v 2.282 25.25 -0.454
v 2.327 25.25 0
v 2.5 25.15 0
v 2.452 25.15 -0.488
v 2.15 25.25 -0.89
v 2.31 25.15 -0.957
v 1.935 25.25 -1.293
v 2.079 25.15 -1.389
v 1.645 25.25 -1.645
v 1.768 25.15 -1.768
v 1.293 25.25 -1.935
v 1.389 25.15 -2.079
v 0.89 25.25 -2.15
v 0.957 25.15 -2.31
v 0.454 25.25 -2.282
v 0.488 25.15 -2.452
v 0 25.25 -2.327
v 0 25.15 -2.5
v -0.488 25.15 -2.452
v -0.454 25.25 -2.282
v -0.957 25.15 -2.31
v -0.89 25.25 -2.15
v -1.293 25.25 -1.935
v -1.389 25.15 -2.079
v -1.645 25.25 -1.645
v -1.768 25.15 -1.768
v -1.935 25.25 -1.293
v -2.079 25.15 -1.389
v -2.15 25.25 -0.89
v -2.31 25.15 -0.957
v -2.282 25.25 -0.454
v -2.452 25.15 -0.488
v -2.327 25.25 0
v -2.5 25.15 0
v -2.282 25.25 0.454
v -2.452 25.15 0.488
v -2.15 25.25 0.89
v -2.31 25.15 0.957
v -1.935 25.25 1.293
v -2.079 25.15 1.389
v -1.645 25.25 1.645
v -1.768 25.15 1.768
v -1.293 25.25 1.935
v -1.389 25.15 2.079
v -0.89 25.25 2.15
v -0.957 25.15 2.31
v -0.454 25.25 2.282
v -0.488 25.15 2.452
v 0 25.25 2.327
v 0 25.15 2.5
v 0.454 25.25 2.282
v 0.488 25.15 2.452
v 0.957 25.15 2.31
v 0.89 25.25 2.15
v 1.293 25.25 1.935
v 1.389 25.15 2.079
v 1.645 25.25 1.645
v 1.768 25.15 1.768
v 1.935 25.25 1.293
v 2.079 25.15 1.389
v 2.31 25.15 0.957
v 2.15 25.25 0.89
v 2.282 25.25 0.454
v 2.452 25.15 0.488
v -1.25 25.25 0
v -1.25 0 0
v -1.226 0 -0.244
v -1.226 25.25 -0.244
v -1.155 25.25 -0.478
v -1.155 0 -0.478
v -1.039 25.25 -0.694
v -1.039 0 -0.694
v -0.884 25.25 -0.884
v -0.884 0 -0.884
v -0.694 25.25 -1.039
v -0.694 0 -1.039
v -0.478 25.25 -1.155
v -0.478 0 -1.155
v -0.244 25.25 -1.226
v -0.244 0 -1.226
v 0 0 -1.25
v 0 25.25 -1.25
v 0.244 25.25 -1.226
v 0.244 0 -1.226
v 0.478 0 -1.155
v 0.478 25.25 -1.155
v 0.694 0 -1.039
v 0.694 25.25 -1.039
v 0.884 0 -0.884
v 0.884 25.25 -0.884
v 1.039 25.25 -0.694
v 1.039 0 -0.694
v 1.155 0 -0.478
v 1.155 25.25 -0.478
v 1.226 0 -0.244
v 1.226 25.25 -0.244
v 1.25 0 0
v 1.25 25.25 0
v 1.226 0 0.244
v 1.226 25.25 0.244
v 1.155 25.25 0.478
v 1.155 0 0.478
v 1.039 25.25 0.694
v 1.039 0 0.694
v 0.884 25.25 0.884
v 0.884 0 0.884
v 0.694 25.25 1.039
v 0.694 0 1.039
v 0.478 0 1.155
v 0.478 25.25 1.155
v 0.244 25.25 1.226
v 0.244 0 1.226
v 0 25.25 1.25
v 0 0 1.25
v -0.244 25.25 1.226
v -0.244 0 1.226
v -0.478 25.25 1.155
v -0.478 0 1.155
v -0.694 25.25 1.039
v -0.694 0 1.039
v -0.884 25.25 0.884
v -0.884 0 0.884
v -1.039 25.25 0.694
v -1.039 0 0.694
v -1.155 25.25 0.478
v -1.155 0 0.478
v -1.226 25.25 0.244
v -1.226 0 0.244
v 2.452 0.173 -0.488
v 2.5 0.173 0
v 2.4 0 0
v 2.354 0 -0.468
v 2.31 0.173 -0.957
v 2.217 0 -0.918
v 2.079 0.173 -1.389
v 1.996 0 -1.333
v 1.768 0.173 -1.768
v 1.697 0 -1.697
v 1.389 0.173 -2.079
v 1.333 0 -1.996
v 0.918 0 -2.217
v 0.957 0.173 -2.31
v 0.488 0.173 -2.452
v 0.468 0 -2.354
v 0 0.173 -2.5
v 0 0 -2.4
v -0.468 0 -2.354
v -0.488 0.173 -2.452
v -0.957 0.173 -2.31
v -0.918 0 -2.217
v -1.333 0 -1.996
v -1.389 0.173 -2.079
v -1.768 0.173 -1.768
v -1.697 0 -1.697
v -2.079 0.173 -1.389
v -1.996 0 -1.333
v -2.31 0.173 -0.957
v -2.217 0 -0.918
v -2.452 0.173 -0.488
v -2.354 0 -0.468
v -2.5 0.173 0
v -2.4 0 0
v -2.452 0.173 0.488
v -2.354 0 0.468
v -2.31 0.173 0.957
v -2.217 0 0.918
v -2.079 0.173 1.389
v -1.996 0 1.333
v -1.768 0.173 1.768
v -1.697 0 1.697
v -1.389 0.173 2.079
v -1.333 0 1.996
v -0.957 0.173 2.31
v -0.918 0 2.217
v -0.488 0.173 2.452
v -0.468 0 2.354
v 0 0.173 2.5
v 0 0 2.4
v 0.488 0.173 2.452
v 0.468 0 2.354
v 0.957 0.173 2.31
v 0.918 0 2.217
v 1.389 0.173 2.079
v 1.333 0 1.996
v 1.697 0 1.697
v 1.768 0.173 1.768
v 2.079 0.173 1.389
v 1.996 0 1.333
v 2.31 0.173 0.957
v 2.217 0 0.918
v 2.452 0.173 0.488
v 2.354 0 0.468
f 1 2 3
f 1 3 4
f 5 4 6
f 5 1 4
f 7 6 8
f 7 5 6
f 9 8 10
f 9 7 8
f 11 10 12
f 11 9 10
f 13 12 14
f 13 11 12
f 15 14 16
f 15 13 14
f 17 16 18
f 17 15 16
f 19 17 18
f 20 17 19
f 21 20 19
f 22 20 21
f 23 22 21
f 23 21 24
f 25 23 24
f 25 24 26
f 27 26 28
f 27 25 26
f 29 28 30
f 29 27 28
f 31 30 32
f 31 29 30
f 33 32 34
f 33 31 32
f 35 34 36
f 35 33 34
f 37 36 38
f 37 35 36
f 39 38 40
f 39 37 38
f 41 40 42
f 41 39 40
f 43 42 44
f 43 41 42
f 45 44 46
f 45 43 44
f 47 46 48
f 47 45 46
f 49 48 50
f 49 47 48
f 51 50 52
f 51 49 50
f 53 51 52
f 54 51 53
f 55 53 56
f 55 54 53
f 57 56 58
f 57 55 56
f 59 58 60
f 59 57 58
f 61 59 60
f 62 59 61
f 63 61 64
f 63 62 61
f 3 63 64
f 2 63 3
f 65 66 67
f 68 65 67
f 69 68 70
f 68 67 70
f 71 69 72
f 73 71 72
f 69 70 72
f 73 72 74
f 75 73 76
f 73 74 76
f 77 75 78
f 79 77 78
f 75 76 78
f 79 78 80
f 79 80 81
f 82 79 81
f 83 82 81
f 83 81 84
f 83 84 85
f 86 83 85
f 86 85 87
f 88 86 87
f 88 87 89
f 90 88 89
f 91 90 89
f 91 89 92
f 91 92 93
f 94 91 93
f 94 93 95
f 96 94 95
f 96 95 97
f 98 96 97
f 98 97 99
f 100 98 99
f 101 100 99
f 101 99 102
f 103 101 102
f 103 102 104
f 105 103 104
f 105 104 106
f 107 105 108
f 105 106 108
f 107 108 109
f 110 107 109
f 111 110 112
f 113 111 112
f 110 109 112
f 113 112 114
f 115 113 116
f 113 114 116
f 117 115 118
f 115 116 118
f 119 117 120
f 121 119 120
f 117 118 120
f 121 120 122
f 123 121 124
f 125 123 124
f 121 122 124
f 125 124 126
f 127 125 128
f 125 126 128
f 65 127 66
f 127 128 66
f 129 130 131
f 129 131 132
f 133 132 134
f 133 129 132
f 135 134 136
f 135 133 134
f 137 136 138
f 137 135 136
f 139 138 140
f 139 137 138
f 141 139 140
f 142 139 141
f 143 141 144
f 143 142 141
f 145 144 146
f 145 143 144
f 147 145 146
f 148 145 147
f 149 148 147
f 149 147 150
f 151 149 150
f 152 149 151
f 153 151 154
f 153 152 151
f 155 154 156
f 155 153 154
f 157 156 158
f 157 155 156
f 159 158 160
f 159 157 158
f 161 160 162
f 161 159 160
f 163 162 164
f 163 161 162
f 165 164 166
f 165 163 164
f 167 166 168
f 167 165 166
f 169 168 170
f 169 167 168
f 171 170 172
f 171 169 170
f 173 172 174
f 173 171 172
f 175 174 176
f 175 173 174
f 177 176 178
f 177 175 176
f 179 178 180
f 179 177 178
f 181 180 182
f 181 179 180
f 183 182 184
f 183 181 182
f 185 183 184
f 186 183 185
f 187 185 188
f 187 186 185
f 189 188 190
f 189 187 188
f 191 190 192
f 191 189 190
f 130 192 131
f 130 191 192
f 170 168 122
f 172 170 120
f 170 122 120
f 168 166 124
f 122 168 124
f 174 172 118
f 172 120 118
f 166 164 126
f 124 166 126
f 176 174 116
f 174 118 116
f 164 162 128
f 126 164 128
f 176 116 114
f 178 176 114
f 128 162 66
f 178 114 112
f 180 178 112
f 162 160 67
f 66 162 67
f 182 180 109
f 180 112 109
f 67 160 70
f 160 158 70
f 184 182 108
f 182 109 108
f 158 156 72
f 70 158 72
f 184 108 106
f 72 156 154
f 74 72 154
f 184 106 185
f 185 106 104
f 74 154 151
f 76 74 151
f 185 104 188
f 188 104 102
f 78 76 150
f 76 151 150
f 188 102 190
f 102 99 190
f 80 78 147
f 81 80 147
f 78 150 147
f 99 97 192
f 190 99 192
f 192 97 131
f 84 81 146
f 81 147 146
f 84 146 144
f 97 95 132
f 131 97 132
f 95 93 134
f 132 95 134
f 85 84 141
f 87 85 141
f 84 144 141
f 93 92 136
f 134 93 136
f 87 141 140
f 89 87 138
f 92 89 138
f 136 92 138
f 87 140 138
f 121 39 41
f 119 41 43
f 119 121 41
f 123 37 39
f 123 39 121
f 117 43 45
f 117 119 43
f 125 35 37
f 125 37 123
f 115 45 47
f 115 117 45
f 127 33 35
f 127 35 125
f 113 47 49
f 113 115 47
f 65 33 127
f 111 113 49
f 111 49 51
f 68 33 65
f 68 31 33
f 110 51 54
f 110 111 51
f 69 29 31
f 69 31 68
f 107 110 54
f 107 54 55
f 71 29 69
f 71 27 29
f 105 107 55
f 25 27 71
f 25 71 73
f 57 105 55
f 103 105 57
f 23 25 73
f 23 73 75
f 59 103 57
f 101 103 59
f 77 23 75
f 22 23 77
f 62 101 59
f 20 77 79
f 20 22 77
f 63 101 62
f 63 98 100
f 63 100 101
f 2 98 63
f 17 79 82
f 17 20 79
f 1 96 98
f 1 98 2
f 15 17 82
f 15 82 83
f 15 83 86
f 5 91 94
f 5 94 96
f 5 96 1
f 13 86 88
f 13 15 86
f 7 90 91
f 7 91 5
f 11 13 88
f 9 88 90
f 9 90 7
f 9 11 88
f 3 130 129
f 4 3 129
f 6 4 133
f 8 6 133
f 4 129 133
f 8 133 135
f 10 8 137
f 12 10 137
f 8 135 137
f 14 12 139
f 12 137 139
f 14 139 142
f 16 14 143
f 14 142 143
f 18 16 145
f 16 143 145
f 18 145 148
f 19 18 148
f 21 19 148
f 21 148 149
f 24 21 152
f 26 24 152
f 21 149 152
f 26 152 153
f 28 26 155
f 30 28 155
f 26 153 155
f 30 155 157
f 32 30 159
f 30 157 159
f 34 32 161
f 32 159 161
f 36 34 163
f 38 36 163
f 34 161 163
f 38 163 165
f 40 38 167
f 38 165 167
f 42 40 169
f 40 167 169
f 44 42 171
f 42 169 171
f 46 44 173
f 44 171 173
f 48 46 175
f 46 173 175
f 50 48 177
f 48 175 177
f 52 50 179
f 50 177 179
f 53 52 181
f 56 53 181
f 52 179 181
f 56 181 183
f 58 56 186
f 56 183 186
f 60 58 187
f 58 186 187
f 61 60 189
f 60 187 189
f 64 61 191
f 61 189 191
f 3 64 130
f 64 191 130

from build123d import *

# Parameters (mm, degrees)
SKETCH2_R             = 2.5
BOSS_EXTRUDE1_DEPTH   = 25.25
CHAMFER1_SIZE         = 0.1
CHAMFER1_SIZE2        = 0.173205081
CHAMFER1_PART_2_SIZE  = 0.1
CHAMFER1_PART_2_SIZE2 = 0.173205081
M3X0_5_TAPPED_HOLE1_D = 2.5


with BuildPart() as part:
    # Sketch2 → Boss-Extrude1 (new body)
    with BuildSketch(Plane(origin=(0, 0, 0), x_dir=(1, 0, 0), z_dir=(0, 1, 0))):
        Circle(SKETCH2_R)
    extrude(amount=BOSS_EXTRUDE1_DEPTH)

    # Chamfer1
    chamfer1_edges = [part.edges().sort_by_distance(p)[0] for p in [
        (-2.5, 0, 0),
    ]]
    chamfer1_side = [part.faces().sort_by_distance(p)[0] for p in [
        (0, 0, 0),
    ]]
    chamfer(chamfer1_edges, length=CHAMFER1_SIZE, length2=CHAMFER1_SIZE2, reference=chamfer1_side[0])

    # Chamfer1 part 2
    chamfer1_part_2_edges = [part.edges().sort_by_distance(p)[0] for p in [
        (-2.5, 25.25, 0),
    ]]
    chamfer1_part_2_side = [part.faces().sort_by_distance(p)[0] for p in [
        (-2.5, 12.625, 0),
    ]]
    chamfer(chamfer1_part_2_edges, length=CHAMFER1_PART_2_SIZE, length2=CHAMFER1_PART_2_SIZE2, reference=chamfer1_part_2_side[0])

    # M3x0.5 Tapped Hole1 (through all)
    with Locations(Plane(origin=(0, 25.25, 0), x_dir=(1, 0, 0), z_dir=(0, 1, 0))):
        with Locations((0, 0)):
            Hole(M3X0_5_TAPPED_HOLE1_D / 2)


solid = part.part
